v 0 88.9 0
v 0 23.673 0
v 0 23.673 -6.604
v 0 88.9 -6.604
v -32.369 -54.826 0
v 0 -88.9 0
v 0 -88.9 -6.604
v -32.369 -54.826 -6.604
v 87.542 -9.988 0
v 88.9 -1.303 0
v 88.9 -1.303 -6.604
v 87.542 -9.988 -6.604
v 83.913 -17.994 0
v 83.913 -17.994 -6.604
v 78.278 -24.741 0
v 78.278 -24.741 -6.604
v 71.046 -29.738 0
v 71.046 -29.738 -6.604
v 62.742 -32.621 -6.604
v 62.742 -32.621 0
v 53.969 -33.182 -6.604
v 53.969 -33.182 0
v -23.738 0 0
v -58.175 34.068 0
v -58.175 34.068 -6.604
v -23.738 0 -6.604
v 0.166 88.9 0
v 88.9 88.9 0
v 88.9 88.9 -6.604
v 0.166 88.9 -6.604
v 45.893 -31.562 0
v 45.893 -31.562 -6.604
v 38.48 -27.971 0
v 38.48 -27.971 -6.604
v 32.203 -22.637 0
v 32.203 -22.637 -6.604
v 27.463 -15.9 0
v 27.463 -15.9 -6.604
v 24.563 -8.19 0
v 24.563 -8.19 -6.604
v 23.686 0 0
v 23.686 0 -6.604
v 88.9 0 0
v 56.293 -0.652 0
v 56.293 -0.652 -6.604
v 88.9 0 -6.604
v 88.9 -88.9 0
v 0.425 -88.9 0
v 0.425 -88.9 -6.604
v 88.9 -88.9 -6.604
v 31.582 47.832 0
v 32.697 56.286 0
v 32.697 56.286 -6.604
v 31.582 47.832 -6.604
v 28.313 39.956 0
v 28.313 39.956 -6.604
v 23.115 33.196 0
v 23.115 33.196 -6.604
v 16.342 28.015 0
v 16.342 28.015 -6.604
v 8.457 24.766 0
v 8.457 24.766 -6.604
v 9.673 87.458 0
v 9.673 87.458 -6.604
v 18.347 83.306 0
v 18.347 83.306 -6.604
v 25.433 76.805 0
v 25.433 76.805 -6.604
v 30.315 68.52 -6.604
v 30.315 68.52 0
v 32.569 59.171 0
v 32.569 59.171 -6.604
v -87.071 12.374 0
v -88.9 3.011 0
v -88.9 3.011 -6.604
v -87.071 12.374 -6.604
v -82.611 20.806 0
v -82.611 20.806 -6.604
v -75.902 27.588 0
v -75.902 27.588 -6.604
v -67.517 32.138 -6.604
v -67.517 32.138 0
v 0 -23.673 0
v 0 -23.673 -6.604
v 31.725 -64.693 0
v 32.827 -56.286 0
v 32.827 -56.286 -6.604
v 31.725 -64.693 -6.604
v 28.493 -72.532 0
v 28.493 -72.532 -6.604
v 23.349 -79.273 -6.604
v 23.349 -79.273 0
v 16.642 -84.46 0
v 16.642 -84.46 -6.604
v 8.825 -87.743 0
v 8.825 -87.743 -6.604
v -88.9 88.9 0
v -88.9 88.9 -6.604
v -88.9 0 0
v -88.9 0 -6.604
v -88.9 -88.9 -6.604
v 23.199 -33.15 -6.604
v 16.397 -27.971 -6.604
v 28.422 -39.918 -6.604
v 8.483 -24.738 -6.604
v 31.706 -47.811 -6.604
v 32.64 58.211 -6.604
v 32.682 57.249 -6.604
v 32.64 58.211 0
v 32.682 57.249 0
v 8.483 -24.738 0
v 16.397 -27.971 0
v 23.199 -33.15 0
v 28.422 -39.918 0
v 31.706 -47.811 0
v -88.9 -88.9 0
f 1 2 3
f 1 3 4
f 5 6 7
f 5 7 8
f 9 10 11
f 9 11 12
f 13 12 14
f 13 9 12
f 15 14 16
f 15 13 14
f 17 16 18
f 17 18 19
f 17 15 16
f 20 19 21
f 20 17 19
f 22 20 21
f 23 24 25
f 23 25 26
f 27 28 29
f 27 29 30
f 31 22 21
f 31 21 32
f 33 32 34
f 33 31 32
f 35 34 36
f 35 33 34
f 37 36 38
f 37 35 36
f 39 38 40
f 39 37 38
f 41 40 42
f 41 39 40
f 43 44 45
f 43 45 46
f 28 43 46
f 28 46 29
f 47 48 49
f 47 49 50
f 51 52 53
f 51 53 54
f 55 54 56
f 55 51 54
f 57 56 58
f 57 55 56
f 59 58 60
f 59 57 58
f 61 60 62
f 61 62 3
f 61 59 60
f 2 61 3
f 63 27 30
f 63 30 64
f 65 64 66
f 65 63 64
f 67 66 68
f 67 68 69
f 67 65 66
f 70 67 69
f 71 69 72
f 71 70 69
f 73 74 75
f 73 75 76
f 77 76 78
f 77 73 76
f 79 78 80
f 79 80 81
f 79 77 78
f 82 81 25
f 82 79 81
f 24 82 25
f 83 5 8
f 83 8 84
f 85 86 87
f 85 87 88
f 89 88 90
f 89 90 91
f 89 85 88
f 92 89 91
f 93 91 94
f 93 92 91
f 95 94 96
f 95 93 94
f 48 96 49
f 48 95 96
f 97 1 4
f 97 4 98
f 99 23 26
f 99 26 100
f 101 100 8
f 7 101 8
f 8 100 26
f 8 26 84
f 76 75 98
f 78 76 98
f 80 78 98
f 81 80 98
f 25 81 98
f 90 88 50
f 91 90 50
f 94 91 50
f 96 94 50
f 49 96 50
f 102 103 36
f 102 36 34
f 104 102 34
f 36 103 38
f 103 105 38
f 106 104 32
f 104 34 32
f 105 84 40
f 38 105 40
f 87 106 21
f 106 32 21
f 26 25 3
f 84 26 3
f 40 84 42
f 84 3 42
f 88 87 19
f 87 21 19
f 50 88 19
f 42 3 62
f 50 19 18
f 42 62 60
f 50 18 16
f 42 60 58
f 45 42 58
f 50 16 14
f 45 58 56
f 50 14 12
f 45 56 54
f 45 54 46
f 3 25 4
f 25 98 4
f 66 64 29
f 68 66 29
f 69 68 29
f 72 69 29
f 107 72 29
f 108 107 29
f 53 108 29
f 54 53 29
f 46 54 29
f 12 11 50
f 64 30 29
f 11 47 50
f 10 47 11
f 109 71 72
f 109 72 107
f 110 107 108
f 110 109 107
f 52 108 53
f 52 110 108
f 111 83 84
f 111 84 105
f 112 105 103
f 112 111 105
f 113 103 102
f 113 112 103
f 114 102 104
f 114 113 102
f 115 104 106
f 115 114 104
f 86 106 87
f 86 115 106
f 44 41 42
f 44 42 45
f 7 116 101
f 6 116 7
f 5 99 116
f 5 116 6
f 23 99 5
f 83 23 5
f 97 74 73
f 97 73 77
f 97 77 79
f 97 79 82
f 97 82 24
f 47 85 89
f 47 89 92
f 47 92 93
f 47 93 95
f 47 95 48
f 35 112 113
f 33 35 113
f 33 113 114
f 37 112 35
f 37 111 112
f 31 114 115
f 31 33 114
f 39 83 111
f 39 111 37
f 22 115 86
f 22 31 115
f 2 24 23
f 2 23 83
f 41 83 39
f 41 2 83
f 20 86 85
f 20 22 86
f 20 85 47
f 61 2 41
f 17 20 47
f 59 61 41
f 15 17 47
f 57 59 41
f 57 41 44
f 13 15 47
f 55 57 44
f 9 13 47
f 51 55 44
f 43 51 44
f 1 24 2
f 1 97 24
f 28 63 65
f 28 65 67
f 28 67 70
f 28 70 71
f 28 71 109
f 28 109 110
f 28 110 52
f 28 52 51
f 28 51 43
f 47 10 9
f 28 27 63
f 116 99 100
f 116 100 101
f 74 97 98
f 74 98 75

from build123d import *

# Parameters (mm, degrees)
F1_DEPTH = 6.604


with BuildPart() as f1:
    # F0 (on Top) → F1 (new body)
    with BuildSketch(Plane.XY):
        Polygon((-88.9, 88.9), (0, 0), (88.9, 88.9), (0, 88.9), align=None)
        with BuildLine():
            ThreePointArc((0, 23.6728), (-32.5308292905, 56.2864), (0, 88.9))
            ThreePointArc((0, 88.9), (22.0701917215, 80.3739843781), (32.5687625572, 59.1710054502))
            ThreePointArc((32.5687625572, 59.1710054502), (32.6646109516, 57.7301179639), (32.6965813095, 56.2864))
            ThreePointArc((32.6965813095, 56.2864), (23.1149284543, 33.1957453196), (0, 23.6728))
        make_face(mode=Mode.SUBTRACT)
        with BuildLine():
            Line((88.9, 88.9), (0, 0))
            Line((0, 0), (88.9, -88.9))
            Line((88.9, -88.9), (88.9, -1.303055018))
            ThreePointArc((88.9, -1.303055018), (78.2779390849, -24.7410549975), (53.9692081511, -33.1822410226))
            ThreePointArc((53.9692081511, -33.1822410226), (32.2033809996, -22.6365581058), (23.6858169762, 0))
            ThreePointArc((23.6858169762, 0), (56.2929084881, 31.962072491), (88.9, 0))
            Line((88.9, 0), (88.9, 88.9))
        make_face()
        with BuildLine():
            Line((-88.9, -88.9), (0, -88.9))
            ThreePointArc((0, -88.9), (-23.4333822085, -78.7489741197), (-32.3691311793, -54.8257820567))
            ThreePointArc((-32.3691311793, -54.8257820567), (-22.4036802199, -32.787394799), (0, -23.6728))
            ThreePointArc((0, -23.6728), (23.1989938683, -33.1496268937), (32.826729568, -56.2864))
            ThreePointArc((32.826729568, -56.2864), (23.3492107959, -79.2729561788), (0.4248753792, -88.9))
            Line((0.4248753792, -88.9), (88.9, -88.9))
            Line((88.9, -88.9), (0, 0))
            Line((0, 0), (-88.9, -88.9))
        make_face()
        with BuildLine():
            Line((-88.9, 0), (-88.9, -88.9))
            Line((-88.9, -88.9), (0, 0))
            Line((0, 0), (-88.9, 88.9))
            Line((-88.9, 88.9), (-88.9, 3.0109182433))
            ThreePointArc((-88.9, 3.0109182433), (-79.5055607914, 24.4438044642), (-58.1749416888, 34.0681895614))
            ThreePointArc((-58.1749416888, 34.0681895614), (-33.9222205657, 25.2151766333), (-23.7036289165, 1.5054591217))
            ThreePointArc((-23.7036289165, 1.5054591217), (-23.7123207699, 0.7525289094), (-23.7383916974, 0))
            ThreePointArc((-23.7383916974, 0), (-56.3191958487, -31.1101078106), (-88.9, 0))
        make_face()
        with BuildLine():
            Line((0, 23.6728), (0, 88.9))
            ThreePointArc((0, 88.9), (-32.5308292905, 56.2864), (0, 23.6728))
        make_face()
        with BuildLine():
            Line((56.2929084881, -0.651527509), (88.9, 0))
            ThreePointArc((88.9, 0), (56.2929084881, 31.962072491), (23.6858169762, 0))
            Line((23.6858169762, 0), (56.2929084881, -0.651527509))
        make_face()
        with BuildLine():
            Line((-23.7383916974, 0), (-88.9, 0))
            ThreePointArc((-88.9, 0), (-56.3191958487, -31.1101078106), (-23.7383916974, 0))
        make_face()
        with BuildLine():
            Line((-58.1749416888, 34.0681895614), (-23.7383916974, 0))
            ThreePointArc((-23.7383916974, 0), (-23.7123207699, 0.7525289094), (-23.7036289165, 1.5054591217))
            ThreePointArc((-23.7036289165, 1.5054591217), (-33.9222205657, 25.2151766333), (-58.1749416888, 34.0681895614))
        make_face()
        with BuildLine():
            ThreePointArc((-32.3691311793, -54.8257820567), (-23.4333822085, -78.7489741197), (0, -88.9))
            Line((0, -88.9), (-32.3691311793, -54.8257820567))
        make_face()
        with BuildLine():
            ThreePointArc((0, -23.6728), (-22.4036802199, -32.787394799), (-32.3691311793, -54.8257820567))
            Line((-32.3691311793, -54.8257820567), (0, -23.6728))
        make_face()
    extrude(amount=-F1_DEPTH)


solid = f1.part
